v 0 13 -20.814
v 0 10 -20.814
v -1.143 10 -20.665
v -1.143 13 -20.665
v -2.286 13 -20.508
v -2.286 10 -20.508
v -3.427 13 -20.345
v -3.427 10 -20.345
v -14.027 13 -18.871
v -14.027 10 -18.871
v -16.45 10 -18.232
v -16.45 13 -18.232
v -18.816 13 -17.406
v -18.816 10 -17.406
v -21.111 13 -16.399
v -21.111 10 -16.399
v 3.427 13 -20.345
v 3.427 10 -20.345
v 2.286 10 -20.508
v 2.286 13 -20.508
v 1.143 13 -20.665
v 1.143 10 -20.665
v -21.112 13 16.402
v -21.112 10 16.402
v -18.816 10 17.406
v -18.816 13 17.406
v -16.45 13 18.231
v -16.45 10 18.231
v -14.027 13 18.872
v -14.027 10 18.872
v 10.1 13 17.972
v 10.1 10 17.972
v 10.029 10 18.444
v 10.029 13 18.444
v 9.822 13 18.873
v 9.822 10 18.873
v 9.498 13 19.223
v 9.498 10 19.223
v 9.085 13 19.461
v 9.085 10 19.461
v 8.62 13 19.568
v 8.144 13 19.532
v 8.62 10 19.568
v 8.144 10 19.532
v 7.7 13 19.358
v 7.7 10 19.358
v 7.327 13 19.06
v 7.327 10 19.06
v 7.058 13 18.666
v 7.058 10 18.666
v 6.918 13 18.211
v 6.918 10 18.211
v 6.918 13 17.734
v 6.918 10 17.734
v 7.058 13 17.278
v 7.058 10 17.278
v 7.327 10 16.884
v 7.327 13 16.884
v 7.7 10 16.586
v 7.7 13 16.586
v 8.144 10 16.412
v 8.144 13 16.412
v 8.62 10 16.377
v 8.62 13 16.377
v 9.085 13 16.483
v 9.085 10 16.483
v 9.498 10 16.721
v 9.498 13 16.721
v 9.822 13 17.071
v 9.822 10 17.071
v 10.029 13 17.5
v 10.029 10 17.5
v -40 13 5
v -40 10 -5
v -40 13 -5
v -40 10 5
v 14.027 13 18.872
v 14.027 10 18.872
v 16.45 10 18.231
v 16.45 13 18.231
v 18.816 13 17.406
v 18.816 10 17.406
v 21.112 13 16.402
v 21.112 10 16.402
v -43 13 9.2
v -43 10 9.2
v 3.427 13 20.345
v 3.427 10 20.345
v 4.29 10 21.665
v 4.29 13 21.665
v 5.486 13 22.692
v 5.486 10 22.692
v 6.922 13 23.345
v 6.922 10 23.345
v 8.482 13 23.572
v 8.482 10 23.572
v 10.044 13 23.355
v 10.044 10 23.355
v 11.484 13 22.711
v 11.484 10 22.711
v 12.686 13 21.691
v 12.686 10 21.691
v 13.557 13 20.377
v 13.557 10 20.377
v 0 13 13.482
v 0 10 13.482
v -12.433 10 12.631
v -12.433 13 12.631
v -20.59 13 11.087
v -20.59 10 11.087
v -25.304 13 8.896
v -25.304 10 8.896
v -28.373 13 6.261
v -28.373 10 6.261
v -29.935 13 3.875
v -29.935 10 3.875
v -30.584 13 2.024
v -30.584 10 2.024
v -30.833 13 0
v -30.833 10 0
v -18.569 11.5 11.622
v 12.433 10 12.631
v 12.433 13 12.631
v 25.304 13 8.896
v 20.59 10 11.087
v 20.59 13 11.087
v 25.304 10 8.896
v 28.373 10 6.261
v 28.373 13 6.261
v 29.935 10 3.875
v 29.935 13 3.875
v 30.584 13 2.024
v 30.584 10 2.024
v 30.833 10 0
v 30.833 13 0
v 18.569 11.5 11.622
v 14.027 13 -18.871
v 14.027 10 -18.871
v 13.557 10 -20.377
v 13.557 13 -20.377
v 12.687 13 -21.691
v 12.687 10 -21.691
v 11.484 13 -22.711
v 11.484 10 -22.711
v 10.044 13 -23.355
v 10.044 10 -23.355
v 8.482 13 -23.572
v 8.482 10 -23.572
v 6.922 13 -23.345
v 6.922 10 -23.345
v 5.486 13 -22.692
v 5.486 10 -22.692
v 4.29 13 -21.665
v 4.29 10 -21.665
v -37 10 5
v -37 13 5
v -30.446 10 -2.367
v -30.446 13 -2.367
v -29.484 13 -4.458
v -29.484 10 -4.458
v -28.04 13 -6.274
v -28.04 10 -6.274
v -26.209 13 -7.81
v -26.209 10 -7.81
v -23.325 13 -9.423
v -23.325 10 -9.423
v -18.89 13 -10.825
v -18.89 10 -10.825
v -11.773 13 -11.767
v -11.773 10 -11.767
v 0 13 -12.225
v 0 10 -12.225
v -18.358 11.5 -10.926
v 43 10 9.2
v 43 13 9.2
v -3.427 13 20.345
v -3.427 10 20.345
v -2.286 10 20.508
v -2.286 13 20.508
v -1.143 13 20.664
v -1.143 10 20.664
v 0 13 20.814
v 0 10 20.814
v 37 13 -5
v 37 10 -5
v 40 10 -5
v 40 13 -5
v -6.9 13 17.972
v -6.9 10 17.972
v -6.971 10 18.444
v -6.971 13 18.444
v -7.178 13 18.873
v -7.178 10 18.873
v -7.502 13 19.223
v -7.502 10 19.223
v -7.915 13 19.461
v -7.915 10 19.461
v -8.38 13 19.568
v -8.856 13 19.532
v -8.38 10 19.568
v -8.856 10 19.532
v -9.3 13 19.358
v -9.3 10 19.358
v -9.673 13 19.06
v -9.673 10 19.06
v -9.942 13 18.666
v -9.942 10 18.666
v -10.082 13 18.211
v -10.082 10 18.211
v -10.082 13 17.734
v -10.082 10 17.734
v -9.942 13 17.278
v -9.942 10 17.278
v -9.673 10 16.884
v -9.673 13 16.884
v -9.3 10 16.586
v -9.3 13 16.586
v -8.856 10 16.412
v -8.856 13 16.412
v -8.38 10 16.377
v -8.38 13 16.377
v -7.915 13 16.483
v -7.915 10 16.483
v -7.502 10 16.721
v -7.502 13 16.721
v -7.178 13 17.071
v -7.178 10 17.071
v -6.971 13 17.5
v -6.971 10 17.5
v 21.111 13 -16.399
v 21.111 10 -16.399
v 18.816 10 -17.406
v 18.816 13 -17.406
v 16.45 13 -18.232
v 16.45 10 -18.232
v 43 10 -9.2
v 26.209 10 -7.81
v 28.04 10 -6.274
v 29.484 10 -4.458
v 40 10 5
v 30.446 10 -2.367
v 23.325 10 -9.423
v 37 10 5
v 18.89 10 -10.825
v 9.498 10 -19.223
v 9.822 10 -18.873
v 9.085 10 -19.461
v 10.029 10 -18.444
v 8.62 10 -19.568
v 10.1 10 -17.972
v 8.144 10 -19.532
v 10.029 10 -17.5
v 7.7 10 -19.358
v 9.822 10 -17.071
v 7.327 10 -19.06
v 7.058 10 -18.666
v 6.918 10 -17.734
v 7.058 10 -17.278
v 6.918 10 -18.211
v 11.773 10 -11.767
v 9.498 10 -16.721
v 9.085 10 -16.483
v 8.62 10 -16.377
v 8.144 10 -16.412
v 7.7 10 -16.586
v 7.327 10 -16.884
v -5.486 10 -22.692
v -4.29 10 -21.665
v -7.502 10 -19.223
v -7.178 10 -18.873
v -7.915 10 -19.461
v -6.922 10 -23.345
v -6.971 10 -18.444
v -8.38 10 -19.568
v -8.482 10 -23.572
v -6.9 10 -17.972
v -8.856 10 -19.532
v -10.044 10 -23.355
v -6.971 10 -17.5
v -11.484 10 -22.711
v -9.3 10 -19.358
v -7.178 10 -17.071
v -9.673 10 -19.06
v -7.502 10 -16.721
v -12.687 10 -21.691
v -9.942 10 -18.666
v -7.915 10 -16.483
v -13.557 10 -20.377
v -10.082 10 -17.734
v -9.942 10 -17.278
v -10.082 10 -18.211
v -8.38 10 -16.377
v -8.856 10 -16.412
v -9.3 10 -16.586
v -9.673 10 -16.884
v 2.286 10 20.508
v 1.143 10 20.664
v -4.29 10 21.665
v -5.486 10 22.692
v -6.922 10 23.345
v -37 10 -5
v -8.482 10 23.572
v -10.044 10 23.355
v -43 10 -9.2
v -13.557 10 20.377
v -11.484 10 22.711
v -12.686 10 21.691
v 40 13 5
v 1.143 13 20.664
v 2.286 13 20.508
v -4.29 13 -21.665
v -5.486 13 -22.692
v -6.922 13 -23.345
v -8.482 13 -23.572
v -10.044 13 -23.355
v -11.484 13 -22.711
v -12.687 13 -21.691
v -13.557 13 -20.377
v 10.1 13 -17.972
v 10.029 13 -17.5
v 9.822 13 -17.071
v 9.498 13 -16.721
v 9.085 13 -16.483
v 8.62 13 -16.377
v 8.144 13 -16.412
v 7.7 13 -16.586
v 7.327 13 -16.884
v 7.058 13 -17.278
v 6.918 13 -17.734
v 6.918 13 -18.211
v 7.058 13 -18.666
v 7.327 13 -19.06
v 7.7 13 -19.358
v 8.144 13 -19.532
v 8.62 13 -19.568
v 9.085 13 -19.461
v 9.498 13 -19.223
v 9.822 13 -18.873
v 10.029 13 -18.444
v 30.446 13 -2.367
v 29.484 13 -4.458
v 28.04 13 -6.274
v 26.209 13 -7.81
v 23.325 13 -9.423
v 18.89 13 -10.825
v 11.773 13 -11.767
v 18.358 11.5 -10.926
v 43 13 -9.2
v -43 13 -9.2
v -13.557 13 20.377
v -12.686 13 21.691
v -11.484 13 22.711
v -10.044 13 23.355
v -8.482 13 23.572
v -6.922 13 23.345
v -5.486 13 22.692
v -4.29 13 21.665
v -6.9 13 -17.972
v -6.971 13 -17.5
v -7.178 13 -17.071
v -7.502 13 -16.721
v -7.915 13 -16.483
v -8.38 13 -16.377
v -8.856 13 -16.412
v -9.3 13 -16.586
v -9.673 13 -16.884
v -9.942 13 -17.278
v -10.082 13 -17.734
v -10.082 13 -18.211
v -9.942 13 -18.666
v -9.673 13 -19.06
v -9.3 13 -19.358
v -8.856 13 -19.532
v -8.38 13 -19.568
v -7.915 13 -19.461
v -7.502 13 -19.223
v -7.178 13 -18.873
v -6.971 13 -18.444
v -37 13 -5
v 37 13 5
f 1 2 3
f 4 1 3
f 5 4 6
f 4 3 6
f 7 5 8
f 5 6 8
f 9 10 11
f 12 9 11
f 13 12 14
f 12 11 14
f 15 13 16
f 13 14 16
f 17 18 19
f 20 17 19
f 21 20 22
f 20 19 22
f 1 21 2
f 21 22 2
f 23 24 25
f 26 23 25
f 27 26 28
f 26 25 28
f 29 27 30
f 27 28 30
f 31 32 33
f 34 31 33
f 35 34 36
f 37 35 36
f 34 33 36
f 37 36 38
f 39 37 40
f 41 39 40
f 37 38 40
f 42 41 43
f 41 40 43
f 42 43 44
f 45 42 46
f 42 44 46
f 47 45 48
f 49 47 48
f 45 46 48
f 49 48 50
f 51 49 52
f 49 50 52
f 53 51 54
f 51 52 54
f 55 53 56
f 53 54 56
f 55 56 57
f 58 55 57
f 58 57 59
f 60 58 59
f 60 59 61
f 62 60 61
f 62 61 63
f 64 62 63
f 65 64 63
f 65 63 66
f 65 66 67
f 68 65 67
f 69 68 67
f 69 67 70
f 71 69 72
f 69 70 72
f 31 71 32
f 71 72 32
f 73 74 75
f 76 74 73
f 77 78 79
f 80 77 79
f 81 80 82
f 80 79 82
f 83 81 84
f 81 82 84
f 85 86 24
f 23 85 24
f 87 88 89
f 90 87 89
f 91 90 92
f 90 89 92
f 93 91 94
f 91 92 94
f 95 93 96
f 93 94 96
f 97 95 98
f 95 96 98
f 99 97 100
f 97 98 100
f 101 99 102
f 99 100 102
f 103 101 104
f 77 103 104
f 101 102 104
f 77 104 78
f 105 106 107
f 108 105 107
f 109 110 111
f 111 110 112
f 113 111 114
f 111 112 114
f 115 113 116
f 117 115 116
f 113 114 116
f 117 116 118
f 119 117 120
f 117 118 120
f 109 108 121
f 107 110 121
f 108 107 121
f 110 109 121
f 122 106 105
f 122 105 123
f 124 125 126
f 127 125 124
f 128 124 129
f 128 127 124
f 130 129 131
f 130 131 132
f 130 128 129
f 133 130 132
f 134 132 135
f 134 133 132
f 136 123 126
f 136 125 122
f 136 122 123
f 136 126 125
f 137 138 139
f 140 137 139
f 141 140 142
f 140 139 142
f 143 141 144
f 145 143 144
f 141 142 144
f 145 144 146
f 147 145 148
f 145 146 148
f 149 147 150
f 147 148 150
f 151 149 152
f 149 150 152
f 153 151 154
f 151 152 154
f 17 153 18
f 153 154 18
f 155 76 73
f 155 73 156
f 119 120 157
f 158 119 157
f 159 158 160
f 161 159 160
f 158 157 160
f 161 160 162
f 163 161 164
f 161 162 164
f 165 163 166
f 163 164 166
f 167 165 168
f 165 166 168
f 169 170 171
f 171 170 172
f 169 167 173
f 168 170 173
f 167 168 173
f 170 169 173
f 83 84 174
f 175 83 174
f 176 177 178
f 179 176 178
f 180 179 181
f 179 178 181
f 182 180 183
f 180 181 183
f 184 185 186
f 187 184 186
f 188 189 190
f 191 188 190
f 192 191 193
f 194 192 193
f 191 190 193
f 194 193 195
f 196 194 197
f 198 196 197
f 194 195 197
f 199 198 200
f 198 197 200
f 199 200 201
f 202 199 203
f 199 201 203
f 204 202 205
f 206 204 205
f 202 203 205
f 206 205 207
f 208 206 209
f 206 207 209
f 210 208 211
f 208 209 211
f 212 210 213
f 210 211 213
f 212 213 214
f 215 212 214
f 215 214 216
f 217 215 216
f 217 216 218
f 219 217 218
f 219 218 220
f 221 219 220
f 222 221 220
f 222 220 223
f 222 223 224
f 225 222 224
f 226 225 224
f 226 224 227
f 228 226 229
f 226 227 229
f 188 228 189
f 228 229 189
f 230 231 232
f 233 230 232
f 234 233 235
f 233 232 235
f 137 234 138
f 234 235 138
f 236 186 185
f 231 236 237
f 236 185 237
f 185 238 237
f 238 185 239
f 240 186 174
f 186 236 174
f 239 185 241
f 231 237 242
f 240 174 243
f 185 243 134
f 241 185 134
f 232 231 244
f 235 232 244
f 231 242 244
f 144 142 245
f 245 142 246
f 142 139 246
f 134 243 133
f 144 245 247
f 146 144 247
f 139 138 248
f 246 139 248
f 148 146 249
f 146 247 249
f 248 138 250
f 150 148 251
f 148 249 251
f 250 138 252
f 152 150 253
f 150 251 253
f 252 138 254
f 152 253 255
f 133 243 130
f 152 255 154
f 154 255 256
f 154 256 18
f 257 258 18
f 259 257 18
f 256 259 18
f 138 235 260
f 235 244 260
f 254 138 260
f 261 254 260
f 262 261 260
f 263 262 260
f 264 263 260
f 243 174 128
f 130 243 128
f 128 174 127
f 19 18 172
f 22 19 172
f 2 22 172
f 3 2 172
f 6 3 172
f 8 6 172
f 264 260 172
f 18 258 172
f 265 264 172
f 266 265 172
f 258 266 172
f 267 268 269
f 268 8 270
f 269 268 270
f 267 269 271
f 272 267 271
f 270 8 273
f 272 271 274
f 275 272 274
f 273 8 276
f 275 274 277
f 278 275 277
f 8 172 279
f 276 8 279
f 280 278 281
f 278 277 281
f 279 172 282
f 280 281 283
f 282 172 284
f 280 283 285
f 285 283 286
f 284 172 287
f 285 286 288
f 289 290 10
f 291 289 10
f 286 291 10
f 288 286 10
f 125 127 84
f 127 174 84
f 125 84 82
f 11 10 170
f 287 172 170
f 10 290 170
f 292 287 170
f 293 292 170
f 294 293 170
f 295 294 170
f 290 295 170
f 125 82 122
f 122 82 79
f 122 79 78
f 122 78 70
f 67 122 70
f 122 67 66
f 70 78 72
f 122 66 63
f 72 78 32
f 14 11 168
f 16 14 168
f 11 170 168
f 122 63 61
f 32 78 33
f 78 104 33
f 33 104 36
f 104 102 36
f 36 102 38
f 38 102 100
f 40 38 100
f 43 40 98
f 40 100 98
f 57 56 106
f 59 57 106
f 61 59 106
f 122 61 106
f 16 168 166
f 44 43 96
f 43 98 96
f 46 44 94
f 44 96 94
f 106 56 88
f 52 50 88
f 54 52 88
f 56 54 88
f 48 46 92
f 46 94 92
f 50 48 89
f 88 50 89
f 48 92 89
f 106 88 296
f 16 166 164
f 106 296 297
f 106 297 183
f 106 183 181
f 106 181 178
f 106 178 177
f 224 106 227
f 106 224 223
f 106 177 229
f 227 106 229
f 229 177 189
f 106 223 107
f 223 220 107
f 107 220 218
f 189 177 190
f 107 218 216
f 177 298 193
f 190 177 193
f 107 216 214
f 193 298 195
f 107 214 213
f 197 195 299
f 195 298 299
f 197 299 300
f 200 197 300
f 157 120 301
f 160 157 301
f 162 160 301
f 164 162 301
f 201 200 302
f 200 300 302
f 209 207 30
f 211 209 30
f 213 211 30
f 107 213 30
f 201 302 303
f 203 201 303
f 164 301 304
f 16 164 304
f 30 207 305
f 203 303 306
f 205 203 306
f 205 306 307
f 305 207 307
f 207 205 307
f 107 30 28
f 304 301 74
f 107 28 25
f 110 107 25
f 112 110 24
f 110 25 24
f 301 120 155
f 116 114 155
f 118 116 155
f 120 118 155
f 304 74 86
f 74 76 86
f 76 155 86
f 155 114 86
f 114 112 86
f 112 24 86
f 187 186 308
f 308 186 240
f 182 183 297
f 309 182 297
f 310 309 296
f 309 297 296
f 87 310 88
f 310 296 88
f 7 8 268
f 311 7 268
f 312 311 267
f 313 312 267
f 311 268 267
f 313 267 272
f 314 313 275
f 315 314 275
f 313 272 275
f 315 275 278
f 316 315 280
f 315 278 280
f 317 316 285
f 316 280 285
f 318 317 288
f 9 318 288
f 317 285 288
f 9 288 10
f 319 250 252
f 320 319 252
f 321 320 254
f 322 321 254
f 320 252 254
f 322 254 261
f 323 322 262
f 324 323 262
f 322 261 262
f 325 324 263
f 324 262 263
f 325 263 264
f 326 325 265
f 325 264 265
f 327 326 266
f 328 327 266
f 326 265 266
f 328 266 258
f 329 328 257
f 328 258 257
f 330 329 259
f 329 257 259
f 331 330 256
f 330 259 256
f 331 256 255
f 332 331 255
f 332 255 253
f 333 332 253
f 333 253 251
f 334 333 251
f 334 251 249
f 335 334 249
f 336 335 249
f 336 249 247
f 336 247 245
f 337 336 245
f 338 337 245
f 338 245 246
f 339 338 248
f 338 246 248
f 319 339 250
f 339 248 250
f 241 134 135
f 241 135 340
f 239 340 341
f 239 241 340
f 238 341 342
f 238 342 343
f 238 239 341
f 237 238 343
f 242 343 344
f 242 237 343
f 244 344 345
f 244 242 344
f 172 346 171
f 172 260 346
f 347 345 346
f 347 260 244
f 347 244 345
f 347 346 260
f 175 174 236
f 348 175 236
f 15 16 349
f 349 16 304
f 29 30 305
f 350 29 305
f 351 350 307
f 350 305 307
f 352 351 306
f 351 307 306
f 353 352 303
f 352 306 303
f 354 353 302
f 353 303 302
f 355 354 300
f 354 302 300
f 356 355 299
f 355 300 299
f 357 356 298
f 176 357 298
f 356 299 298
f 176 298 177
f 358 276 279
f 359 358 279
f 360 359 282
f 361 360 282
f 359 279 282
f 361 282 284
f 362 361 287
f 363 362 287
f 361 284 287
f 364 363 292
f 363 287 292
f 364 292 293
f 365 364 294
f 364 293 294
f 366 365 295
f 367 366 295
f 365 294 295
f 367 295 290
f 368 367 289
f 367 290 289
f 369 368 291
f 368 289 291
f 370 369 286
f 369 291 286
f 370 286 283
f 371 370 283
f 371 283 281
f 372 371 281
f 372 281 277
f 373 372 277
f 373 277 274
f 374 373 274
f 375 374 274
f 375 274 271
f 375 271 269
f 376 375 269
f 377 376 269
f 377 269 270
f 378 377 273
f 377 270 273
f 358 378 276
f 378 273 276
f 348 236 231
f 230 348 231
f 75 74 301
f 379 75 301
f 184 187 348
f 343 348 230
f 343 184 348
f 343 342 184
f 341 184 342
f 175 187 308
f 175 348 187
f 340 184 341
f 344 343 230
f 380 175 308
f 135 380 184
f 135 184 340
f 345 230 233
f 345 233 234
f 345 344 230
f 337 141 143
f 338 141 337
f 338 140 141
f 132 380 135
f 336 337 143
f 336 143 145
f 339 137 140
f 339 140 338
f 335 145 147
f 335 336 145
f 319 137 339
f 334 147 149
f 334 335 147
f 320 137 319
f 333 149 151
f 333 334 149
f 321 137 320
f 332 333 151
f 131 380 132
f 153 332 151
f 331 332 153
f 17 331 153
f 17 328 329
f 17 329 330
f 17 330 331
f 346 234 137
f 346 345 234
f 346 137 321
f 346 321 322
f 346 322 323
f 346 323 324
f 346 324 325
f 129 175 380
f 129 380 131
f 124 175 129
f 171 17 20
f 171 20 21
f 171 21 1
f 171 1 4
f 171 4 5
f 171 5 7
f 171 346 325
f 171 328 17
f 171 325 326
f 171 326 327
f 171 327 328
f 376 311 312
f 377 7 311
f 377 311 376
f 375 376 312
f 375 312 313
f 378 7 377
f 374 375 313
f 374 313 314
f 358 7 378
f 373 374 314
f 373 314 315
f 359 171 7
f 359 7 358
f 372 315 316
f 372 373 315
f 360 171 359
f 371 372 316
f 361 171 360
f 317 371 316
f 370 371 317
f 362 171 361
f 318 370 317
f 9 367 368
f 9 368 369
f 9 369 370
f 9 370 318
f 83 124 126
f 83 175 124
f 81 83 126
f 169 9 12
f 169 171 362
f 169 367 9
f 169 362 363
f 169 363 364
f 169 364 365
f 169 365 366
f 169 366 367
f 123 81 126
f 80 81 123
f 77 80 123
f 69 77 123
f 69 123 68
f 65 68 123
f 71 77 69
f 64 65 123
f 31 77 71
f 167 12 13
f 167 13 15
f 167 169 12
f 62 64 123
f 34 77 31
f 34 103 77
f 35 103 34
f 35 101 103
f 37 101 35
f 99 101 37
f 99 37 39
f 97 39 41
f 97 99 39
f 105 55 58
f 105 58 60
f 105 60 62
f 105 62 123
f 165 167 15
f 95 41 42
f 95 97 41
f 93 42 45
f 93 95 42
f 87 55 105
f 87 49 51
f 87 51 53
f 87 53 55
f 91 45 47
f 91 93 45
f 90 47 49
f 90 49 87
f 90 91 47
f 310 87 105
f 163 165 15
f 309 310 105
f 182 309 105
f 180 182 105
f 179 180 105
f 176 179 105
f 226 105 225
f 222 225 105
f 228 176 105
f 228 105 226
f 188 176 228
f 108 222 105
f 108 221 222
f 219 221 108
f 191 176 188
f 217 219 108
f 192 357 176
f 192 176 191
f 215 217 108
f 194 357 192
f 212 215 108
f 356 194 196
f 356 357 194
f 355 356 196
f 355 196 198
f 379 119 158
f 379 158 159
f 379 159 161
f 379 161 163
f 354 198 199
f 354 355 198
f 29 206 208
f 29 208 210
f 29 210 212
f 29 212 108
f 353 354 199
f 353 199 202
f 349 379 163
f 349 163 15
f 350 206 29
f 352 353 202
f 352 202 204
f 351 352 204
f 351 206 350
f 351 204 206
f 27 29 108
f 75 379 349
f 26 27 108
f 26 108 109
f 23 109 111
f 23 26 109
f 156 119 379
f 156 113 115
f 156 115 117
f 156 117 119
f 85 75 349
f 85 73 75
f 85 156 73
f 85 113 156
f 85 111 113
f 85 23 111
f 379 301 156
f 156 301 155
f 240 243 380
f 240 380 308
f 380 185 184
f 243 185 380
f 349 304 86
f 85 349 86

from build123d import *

# Parameters (mm, degrees)
ESBO_O1_R                = 1.6
ESBO_O1_R_2              = 1.600000007
ESBO_O1_W                = 3
ESBO_O1_H                = 10
RESSALTO_EXTRUS_O1_DEPTH = 3


with BuildPart() as part:
    # Esboço1 → Ressalto-extrusão1 (new body)
    with BuildSketch(Plane.XZ.offset(-10)):
        with BuildLine():
            Line((42.999999997, -9.199919627), (21.11055054, -16.399388678))
            ThreePointArc((21.11055054, -16.399388678), (17.640967155, -17.841864894), (14.027295524, -18.871488049))
            ThreePointArc((14.027295524, -18.871488049), (9.270943356, -23.518767255), (3.427492506, -20.344783619))
            ThreePointArc((3.427492506, -20.344783619), (1.714787578, -20.587160488), (-3e-09, -20.814335031))
            ThreePointArc((-3e-09, -20.814335031), (-1.714787584, -20.587160488), (-3.427492513, -20.344783619))
            ThreePointArc((-3.427492513, -20.344783619), (-9.270943363, -23.518767255), (-14.02729553, -18.871488049))
            ThreePointArc((-14.02729553, -18.871488049), (-17.640967162, -17.841864894), (-21.110550547, -16.399388678))
            Line((-21.110550547, -16.399388678), (-43.000000003, -9.199919627))
            Line((-43.000000003, -9.199919627), (-43.000000003, 9.199919627))
            Line((-43.000000003, 9.199919627), (-21.111527461, 16.402363453))
            ThreePointArc((-21.111527461, 16.402363453), (-17.64068144, 17.841429998), (-14.027295586, 18.871540329))
            ThreePointArc((-14.027295586, 18.871540329), (-9.270915171, 23.518776829), (-3.427486355, 20.344772827))
            ThreePointArc((-3.427486355, 20.344772827), (-1.714766445, 20.587024324), (-3e-09, 20.814337605))
            ThreePointArc((-3e-09, 20.814337605), (1.714766438, 20.587024324), (3.427486348, 20.344772827))
            ThreePointArc((3.427486348, 20.344772827), (9.270915164, 23.518776829), (14.027295579, 18.871540329))
            ThreePointArc((14.027295579, 18.871540329), (17.640681433, 17.841429998), (21.111527454, 16.402363453))
            Line((21.111527454, 16.402363453), (42.999999997, 9.199919627))
            Line((42.999999997, 9.199919627), (42.999999997, -9.199919627))
        make_face()
        with Locations((-8.499996016, -17.972093401)):
            Circle(ESBO_O1_R, mode=Mode.SUBTRACT)
        with Locations((-8.500000045, 17.972094091)):
            Circle(ESBO_O1_R_2, mode=Mode.SUBTRACT)
        with Locations((8.500000038, 17.972094091)):
            Circle(ESBO_O1_R_2, mode=Mode.SUBTRACT)
        with Locations((8.499996009, -17.972093401)):
            Circle(ESBO_O1_R, mode=Mode.SUBTRACT)
        with Locations((-38.500000003, 0)):
            Rectangle(ESBO_O1_W, ESBO_O1_H, mode=Mode.SUBTRACT)
        with Locations((38.499999997, 0)):
            Rectangle(ESBO_O1_W, ESBO_O1_H, mode=Mode.SUBTRACT)
        with BuildLine():
            add(Edge.make_bspline(
                [(0, 13.48175396), (-6.225840887, 13.243866192), (-12.481673421, 12.925170728), (-24.656030895, 10.319444852), (-30.737996444, 6.272836714), (-30.833333333, 0)],
                knots=[0, 0, 0, 0, 0.5, 0.5, 1, 1, 1, 1], degree=3))
            add(Edge.make_bspline(
                [(-30.833333333, 0), (-30.664662625, -6.169349261), (-24.406493372, -9.849880174), (-12.309360845, -12.002886564), (-6.143049468, -12.144365954), (-7e-09, -12.225)],
                knots=[0, 0, 0, 0, 0.5, 0.5, 1, 1, 1, 1], degree=3))
            add(Edge.make_bspline(
                [(30.833333326, 0), (30.664662618, -6.169349261), (24.406493365, -9.849880174), (12.309360838, -12.002886564), (6.143049461, -12.144365954), (-7e-09, -12.225)],
                knots=[0, 0, 0, 0, 0.5, 0.5, 1, 1, 1, 1], degree=3))
            add(Edge.make_bspline(
                [(0, 13.48175396), (6.22584088, 13.243866192), (12.481673414, 12.925170728), (24.656030889, 10.319444852), (30.737996437, 6.272836714), (30.833333326, 0)],
                knots=[0, 0, 0, 0, 0.5, 0.5, 1, 1, 1, 1], degree=3))
        make_face(mode=Mode.SUBTRACT)
    extrude(amount=-RESSALTO_EXTRUS_O1_DEPTH)


solid = part.part
